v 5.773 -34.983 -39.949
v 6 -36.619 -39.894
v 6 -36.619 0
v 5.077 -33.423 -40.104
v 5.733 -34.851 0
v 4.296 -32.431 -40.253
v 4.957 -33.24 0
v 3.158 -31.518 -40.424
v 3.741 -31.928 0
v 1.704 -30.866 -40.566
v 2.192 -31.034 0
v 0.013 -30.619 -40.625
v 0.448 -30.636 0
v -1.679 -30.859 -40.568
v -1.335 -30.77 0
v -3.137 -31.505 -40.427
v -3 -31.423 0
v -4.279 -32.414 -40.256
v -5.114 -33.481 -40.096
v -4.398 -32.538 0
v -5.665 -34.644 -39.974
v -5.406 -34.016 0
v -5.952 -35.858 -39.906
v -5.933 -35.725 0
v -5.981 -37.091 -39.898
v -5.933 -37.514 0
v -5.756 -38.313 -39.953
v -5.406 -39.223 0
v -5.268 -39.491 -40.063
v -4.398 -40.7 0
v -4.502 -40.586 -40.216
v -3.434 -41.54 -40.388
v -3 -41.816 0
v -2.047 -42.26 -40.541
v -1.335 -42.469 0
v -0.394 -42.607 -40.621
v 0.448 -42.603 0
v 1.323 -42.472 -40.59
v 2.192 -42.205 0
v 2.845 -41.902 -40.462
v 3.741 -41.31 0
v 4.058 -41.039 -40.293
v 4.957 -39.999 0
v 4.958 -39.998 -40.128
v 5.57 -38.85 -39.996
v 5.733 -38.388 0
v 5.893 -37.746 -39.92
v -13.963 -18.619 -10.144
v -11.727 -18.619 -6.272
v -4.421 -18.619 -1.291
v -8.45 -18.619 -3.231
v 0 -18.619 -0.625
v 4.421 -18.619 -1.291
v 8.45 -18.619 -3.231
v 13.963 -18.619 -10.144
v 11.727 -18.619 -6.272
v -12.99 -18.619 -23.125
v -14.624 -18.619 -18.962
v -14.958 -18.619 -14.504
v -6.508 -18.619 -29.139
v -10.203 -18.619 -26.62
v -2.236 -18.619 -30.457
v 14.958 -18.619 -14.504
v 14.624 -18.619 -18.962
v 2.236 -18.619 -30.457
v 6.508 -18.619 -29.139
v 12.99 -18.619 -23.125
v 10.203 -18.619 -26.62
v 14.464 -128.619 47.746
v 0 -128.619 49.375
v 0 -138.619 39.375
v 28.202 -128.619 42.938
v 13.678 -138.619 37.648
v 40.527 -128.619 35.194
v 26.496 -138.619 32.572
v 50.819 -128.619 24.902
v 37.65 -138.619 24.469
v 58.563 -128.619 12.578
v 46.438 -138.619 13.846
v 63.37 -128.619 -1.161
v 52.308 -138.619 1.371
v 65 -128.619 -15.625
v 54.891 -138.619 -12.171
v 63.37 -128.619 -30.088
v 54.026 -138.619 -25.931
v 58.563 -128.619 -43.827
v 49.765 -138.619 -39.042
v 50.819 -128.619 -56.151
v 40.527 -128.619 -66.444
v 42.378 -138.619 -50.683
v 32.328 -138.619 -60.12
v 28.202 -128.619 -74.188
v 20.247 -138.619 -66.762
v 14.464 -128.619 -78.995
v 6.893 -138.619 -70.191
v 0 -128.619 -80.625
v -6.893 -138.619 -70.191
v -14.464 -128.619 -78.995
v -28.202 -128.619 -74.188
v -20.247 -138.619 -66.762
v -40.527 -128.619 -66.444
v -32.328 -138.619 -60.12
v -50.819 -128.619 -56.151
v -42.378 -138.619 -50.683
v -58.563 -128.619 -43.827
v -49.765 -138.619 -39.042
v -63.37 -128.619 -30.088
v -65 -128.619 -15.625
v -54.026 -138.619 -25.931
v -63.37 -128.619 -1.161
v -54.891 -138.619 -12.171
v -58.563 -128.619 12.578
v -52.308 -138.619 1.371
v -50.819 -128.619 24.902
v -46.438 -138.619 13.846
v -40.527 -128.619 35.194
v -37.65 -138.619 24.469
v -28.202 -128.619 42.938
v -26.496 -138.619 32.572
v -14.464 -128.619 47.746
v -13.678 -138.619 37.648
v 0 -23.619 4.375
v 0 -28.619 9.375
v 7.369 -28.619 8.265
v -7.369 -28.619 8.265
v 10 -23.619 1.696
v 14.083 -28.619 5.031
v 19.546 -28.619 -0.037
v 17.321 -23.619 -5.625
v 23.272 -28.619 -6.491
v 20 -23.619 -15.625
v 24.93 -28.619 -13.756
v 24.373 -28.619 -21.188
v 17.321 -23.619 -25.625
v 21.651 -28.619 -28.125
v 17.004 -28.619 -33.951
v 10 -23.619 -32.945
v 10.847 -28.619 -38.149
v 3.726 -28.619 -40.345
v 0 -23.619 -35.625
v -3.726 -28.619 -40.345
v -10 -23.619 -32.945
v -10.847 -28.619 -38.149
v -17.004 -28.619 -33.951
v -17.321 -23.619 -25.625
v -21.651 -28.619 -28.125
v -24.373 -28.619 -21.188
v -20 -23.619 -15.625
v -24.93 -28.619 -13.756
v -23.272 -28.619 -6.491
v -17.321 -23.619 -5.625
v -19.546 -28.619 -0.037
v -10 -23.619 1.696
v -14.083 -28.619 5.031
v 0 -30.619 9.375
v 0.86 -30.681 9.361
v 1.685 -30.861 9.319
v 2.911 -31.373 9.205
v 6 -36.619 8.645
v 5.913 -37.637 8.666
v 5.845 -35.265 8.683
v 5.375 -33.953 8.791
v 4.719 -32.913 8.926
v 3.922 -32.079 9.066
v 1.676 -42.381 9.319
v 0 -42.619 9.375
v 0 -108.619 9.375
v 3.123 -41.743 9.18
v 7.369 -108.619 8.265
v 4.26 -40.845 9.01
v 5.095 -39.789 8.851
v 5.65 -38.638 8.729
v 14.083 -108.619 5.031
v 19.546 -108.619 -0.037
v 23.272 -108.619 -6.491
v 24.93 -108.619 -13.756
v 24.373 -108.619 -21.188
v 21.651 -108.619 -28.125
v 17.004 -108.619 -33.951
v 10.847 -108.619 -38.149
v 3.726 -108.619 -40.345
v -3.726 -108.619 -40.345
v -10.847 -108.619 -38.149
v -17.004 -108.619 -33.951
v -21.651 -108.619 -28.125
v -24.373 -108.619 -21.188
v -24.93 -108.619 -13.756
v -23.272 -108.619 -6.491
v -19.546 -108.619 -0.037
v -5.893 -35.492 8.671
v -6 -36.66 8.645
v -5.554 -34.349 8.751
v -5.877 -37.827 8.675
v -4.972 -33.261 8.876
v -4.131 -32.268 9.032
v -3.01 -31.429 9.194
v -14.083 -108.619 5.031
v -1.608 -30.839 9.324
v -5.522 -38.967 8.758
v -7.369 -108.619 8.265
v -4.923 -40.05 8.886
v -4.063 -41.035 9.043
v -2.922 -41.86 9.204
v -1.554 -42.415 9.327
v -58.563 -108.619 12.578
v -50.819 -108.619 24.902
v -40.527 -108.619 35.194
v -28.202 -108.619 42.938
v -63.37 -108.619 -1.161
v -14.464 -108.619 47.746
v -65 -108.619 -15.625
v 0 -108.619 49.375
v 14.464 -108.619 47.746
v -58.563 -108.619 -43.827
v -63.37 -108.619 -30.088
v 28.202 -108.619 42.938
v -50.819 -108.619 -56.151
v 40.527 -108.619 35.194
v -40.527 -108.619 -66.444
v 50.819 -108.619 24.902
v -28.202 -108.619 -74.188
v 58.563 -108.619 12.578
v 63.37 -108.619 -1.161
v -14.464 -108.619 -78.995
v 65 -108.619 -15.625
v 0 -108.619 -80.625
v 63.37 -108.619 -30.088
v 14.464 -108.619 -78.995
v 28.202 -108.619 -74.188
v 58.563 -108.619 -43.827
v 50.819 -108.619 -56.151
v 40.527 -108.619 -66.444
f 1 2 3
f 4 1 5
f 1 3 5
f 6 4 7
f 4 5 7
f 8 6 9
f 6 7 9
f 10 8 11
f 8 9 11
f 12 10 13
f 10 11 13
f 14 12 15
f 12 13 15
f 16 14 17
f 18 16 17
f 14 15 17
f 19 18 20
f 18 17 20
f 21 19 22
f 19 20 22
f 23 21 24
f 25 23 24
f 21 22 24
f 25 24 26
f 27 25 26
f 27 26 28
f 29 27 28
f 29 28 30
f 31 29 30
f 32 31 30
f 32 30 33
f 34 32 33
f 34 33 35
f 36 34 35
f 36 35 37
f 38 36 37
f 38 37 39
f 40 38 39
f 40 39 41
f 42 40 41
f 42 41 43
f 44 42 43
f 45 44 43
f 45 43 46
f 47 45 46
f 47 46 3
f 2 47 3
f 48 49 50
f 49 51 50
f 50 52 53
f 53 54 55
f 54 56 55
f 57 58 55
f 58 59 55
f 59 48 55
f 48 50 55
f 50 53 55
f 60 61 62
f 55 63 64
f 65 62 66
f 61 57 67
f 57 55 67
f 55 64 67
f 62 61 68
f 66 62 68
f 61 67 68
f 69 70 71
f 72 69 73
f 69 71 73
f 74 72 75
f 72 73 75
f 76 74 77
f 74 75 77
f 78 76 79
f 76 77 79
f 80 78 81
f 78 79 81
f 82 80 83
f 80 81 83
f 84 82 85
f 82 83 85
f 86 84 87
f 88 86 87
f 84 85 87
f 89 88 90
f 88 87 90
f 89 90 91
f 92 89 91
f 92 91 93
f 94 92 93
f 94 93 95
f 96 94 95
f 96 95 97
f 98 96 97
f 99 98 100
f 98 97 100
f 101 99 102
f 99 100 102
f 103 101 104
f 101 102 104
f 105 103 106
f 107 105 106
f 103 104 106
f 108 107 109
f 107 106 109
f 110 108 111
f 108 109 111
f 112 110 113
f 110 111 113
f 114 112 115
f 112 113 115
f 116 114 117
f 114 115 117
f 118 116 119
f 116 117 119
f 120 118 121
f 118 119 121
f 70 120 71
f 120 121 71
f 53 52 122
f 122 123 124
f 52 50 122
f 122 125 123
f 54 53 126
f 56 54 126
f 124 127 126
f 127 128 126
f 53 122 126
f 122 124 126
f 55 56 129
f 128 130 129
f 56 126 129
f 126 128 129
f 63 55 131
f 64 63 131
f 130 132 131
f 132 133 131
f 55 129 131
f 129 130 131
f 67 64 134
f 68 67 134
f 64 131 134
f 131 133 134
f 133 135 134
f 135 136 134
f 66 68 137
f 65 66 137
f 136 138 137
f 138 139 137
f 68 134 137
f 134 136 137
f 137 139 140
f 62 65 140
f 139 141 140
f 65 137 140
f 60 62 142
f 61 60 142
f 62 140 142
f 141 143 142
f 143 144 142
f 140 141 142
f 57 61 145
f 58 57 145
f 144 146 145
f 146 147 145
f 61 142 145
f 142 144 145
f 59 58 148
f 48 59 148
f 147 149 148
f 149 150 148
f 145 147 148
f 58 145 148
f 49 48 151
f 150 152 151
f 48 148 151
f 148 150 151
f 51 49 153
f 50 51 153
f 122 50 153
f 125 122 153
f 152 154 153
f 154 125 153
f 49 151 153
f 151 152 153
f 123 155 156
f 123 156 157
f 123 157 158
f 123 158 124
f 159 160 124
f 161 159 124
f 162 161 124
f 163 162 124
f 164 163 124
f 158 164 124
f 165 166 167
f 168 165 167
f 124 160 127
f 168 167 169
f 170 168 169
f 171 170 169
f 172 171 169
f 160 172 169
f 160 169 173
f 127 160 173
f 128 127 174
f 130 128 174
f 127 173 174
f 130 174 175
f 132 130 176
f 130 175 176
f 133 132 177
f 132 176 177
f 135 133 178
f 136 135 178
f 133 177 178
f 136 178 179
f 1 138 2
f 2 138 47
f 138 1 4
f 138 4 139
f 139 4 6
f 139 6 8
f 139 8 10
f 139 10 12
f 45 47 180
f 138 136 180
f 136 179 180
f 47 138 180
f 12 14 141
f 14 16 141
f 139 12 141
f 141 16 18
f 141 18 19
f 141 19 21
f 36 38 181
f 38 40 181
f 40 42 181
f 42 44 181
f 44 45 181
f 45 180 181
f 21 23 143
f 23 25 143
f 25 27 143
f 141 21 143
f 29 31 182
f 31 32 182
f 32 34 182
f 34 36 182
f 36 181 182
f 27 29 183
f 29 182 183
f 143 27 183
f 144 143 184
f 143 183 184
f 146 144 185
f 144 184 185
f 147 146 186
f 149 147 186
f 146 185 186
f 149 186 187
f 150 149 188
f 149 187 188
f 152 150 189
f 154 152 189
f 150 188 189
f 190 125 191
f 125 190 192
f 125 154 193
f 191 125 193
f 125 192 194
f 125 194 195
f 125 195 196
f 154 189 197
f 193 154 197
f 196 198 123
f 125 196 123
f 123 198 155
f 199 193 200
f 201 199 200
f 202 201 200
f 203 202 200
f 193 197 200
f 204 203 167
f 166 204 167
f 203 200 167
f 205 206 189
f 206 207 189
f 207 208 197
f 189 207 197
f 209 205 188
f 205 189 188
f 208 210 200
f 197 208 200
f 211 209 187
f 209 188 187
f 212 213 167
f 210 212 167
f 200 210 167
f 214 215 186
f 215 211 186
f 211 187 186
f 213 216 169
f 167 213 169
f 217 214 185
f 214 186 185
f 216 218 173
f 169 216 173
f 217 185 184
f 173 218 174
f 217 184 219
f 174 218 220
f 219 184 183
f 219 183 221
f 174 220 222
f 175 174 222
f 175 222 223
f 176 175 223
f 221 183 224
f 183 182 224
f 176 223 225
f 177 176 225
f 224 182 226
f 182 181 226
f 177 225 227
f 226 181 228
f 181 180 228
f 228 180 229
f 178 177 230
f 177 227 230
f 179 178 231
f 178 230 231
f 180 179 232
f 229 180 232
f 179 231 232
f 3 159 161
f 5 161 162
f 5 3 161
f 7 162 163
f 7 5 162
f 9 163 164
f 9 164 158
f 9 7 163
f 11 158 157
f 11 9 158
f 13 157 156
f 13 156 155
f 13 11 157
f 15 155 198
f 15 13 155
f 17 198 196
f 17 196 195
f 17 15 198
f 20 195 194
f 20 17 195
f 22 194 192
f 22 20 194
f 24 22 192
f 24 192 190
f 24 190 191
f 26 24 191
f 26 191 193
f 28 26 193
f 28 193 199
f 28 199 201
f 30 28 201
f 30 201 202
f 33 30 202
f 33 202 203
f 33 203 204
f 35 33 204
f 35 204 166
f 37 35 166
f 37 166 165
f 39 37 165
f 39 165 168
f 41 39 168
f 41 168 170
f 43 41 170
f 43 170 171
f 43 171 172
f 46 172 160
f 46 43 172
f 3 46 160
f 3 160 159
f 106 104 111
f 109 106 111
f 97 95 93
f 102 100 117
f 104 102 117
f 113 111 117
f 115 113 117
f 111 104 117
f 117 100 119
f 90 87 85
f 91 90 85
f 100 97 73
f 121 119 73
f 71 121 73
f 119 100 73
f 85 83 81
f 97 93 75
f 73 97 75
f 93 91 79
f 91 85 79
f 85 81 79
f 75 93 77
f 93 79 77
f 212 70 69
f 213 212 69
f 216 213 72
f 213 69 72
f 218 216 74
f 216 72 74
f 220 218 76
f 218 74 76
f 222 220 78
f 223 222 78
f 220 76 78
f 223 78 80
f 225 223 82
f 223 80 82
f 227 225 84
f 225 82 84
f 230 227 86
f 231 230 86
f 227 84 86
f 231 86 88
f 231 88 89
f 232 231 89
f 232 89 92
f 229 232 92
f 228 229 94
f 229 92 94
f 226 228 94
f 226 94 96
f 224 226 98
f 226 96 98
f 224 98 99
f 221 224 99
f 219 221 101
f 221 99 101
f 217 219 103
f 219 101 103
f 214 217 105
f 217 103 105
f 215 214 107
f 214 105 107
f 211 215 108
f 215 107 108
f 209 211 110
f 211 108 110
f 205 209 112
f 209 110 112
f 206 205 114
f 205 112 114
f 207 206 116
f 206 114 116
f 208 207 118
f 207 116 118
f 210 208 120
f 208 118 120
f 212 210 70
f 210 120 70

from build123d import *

# Parameters (mm, degrees)
F2_SIZE2      = 10
F2_SIZE       = 10
F3_SIZE2      = 10
F3_SIZE       = 10
F4_R          = 6
F5_DEPTH      = 80.6255635247
F5_DEPTH_BACK = 49.3764364753


with BuildPart() as f1:
    # F0 (on Right) → F1 (revolve)
    with BuildSketch(Plane.YZ):
        Polygon((-138.6194518108, 49.3754364753), (-138.6194518108, -15.6245635247), (-18.6194518108, -15.6245635247), (-18.6194518108, 9.3754364753), (-108.6194518108, 9.3754364753), (-108.6194518108, 49.3754364753), align=None)
    revolve(axis=Axis((0, -78.6194518108, -15.6245635247), (0, 1, 0)))

    # F2
    f2_edges = [f1.edges().sort_by_distance(p)[0] for p in [
        (0, -18.619452, -40.624564),
    ]]
    chamfer(f2_edges, length=F2_SIZE, length2=F2_SIZE2)

    # F3
    f3_edges = [f1.edges().sort_by_distance(p)[0] for p in [
        (0, -138.619452, -80.624564),
    ]]
    chamfer(f3_edges, length=F3_SIZE, length2=F3_SIZE2)

    # F4 (on Top) → F5 (cut, two sides)
    with BuildSketch(Plane.XY) as f5_sk:
        with Locations((0, -36.6194518108)):
            Circle(F4_R)
    extrude(amount=-F5_DEPTH, mode=Mode.SUBTRACT)
    extrude(f5_sk.sketch, amount=F5_DEPTH_BACK, mode=Mode.SUBTRACT)


solid = f1.part
